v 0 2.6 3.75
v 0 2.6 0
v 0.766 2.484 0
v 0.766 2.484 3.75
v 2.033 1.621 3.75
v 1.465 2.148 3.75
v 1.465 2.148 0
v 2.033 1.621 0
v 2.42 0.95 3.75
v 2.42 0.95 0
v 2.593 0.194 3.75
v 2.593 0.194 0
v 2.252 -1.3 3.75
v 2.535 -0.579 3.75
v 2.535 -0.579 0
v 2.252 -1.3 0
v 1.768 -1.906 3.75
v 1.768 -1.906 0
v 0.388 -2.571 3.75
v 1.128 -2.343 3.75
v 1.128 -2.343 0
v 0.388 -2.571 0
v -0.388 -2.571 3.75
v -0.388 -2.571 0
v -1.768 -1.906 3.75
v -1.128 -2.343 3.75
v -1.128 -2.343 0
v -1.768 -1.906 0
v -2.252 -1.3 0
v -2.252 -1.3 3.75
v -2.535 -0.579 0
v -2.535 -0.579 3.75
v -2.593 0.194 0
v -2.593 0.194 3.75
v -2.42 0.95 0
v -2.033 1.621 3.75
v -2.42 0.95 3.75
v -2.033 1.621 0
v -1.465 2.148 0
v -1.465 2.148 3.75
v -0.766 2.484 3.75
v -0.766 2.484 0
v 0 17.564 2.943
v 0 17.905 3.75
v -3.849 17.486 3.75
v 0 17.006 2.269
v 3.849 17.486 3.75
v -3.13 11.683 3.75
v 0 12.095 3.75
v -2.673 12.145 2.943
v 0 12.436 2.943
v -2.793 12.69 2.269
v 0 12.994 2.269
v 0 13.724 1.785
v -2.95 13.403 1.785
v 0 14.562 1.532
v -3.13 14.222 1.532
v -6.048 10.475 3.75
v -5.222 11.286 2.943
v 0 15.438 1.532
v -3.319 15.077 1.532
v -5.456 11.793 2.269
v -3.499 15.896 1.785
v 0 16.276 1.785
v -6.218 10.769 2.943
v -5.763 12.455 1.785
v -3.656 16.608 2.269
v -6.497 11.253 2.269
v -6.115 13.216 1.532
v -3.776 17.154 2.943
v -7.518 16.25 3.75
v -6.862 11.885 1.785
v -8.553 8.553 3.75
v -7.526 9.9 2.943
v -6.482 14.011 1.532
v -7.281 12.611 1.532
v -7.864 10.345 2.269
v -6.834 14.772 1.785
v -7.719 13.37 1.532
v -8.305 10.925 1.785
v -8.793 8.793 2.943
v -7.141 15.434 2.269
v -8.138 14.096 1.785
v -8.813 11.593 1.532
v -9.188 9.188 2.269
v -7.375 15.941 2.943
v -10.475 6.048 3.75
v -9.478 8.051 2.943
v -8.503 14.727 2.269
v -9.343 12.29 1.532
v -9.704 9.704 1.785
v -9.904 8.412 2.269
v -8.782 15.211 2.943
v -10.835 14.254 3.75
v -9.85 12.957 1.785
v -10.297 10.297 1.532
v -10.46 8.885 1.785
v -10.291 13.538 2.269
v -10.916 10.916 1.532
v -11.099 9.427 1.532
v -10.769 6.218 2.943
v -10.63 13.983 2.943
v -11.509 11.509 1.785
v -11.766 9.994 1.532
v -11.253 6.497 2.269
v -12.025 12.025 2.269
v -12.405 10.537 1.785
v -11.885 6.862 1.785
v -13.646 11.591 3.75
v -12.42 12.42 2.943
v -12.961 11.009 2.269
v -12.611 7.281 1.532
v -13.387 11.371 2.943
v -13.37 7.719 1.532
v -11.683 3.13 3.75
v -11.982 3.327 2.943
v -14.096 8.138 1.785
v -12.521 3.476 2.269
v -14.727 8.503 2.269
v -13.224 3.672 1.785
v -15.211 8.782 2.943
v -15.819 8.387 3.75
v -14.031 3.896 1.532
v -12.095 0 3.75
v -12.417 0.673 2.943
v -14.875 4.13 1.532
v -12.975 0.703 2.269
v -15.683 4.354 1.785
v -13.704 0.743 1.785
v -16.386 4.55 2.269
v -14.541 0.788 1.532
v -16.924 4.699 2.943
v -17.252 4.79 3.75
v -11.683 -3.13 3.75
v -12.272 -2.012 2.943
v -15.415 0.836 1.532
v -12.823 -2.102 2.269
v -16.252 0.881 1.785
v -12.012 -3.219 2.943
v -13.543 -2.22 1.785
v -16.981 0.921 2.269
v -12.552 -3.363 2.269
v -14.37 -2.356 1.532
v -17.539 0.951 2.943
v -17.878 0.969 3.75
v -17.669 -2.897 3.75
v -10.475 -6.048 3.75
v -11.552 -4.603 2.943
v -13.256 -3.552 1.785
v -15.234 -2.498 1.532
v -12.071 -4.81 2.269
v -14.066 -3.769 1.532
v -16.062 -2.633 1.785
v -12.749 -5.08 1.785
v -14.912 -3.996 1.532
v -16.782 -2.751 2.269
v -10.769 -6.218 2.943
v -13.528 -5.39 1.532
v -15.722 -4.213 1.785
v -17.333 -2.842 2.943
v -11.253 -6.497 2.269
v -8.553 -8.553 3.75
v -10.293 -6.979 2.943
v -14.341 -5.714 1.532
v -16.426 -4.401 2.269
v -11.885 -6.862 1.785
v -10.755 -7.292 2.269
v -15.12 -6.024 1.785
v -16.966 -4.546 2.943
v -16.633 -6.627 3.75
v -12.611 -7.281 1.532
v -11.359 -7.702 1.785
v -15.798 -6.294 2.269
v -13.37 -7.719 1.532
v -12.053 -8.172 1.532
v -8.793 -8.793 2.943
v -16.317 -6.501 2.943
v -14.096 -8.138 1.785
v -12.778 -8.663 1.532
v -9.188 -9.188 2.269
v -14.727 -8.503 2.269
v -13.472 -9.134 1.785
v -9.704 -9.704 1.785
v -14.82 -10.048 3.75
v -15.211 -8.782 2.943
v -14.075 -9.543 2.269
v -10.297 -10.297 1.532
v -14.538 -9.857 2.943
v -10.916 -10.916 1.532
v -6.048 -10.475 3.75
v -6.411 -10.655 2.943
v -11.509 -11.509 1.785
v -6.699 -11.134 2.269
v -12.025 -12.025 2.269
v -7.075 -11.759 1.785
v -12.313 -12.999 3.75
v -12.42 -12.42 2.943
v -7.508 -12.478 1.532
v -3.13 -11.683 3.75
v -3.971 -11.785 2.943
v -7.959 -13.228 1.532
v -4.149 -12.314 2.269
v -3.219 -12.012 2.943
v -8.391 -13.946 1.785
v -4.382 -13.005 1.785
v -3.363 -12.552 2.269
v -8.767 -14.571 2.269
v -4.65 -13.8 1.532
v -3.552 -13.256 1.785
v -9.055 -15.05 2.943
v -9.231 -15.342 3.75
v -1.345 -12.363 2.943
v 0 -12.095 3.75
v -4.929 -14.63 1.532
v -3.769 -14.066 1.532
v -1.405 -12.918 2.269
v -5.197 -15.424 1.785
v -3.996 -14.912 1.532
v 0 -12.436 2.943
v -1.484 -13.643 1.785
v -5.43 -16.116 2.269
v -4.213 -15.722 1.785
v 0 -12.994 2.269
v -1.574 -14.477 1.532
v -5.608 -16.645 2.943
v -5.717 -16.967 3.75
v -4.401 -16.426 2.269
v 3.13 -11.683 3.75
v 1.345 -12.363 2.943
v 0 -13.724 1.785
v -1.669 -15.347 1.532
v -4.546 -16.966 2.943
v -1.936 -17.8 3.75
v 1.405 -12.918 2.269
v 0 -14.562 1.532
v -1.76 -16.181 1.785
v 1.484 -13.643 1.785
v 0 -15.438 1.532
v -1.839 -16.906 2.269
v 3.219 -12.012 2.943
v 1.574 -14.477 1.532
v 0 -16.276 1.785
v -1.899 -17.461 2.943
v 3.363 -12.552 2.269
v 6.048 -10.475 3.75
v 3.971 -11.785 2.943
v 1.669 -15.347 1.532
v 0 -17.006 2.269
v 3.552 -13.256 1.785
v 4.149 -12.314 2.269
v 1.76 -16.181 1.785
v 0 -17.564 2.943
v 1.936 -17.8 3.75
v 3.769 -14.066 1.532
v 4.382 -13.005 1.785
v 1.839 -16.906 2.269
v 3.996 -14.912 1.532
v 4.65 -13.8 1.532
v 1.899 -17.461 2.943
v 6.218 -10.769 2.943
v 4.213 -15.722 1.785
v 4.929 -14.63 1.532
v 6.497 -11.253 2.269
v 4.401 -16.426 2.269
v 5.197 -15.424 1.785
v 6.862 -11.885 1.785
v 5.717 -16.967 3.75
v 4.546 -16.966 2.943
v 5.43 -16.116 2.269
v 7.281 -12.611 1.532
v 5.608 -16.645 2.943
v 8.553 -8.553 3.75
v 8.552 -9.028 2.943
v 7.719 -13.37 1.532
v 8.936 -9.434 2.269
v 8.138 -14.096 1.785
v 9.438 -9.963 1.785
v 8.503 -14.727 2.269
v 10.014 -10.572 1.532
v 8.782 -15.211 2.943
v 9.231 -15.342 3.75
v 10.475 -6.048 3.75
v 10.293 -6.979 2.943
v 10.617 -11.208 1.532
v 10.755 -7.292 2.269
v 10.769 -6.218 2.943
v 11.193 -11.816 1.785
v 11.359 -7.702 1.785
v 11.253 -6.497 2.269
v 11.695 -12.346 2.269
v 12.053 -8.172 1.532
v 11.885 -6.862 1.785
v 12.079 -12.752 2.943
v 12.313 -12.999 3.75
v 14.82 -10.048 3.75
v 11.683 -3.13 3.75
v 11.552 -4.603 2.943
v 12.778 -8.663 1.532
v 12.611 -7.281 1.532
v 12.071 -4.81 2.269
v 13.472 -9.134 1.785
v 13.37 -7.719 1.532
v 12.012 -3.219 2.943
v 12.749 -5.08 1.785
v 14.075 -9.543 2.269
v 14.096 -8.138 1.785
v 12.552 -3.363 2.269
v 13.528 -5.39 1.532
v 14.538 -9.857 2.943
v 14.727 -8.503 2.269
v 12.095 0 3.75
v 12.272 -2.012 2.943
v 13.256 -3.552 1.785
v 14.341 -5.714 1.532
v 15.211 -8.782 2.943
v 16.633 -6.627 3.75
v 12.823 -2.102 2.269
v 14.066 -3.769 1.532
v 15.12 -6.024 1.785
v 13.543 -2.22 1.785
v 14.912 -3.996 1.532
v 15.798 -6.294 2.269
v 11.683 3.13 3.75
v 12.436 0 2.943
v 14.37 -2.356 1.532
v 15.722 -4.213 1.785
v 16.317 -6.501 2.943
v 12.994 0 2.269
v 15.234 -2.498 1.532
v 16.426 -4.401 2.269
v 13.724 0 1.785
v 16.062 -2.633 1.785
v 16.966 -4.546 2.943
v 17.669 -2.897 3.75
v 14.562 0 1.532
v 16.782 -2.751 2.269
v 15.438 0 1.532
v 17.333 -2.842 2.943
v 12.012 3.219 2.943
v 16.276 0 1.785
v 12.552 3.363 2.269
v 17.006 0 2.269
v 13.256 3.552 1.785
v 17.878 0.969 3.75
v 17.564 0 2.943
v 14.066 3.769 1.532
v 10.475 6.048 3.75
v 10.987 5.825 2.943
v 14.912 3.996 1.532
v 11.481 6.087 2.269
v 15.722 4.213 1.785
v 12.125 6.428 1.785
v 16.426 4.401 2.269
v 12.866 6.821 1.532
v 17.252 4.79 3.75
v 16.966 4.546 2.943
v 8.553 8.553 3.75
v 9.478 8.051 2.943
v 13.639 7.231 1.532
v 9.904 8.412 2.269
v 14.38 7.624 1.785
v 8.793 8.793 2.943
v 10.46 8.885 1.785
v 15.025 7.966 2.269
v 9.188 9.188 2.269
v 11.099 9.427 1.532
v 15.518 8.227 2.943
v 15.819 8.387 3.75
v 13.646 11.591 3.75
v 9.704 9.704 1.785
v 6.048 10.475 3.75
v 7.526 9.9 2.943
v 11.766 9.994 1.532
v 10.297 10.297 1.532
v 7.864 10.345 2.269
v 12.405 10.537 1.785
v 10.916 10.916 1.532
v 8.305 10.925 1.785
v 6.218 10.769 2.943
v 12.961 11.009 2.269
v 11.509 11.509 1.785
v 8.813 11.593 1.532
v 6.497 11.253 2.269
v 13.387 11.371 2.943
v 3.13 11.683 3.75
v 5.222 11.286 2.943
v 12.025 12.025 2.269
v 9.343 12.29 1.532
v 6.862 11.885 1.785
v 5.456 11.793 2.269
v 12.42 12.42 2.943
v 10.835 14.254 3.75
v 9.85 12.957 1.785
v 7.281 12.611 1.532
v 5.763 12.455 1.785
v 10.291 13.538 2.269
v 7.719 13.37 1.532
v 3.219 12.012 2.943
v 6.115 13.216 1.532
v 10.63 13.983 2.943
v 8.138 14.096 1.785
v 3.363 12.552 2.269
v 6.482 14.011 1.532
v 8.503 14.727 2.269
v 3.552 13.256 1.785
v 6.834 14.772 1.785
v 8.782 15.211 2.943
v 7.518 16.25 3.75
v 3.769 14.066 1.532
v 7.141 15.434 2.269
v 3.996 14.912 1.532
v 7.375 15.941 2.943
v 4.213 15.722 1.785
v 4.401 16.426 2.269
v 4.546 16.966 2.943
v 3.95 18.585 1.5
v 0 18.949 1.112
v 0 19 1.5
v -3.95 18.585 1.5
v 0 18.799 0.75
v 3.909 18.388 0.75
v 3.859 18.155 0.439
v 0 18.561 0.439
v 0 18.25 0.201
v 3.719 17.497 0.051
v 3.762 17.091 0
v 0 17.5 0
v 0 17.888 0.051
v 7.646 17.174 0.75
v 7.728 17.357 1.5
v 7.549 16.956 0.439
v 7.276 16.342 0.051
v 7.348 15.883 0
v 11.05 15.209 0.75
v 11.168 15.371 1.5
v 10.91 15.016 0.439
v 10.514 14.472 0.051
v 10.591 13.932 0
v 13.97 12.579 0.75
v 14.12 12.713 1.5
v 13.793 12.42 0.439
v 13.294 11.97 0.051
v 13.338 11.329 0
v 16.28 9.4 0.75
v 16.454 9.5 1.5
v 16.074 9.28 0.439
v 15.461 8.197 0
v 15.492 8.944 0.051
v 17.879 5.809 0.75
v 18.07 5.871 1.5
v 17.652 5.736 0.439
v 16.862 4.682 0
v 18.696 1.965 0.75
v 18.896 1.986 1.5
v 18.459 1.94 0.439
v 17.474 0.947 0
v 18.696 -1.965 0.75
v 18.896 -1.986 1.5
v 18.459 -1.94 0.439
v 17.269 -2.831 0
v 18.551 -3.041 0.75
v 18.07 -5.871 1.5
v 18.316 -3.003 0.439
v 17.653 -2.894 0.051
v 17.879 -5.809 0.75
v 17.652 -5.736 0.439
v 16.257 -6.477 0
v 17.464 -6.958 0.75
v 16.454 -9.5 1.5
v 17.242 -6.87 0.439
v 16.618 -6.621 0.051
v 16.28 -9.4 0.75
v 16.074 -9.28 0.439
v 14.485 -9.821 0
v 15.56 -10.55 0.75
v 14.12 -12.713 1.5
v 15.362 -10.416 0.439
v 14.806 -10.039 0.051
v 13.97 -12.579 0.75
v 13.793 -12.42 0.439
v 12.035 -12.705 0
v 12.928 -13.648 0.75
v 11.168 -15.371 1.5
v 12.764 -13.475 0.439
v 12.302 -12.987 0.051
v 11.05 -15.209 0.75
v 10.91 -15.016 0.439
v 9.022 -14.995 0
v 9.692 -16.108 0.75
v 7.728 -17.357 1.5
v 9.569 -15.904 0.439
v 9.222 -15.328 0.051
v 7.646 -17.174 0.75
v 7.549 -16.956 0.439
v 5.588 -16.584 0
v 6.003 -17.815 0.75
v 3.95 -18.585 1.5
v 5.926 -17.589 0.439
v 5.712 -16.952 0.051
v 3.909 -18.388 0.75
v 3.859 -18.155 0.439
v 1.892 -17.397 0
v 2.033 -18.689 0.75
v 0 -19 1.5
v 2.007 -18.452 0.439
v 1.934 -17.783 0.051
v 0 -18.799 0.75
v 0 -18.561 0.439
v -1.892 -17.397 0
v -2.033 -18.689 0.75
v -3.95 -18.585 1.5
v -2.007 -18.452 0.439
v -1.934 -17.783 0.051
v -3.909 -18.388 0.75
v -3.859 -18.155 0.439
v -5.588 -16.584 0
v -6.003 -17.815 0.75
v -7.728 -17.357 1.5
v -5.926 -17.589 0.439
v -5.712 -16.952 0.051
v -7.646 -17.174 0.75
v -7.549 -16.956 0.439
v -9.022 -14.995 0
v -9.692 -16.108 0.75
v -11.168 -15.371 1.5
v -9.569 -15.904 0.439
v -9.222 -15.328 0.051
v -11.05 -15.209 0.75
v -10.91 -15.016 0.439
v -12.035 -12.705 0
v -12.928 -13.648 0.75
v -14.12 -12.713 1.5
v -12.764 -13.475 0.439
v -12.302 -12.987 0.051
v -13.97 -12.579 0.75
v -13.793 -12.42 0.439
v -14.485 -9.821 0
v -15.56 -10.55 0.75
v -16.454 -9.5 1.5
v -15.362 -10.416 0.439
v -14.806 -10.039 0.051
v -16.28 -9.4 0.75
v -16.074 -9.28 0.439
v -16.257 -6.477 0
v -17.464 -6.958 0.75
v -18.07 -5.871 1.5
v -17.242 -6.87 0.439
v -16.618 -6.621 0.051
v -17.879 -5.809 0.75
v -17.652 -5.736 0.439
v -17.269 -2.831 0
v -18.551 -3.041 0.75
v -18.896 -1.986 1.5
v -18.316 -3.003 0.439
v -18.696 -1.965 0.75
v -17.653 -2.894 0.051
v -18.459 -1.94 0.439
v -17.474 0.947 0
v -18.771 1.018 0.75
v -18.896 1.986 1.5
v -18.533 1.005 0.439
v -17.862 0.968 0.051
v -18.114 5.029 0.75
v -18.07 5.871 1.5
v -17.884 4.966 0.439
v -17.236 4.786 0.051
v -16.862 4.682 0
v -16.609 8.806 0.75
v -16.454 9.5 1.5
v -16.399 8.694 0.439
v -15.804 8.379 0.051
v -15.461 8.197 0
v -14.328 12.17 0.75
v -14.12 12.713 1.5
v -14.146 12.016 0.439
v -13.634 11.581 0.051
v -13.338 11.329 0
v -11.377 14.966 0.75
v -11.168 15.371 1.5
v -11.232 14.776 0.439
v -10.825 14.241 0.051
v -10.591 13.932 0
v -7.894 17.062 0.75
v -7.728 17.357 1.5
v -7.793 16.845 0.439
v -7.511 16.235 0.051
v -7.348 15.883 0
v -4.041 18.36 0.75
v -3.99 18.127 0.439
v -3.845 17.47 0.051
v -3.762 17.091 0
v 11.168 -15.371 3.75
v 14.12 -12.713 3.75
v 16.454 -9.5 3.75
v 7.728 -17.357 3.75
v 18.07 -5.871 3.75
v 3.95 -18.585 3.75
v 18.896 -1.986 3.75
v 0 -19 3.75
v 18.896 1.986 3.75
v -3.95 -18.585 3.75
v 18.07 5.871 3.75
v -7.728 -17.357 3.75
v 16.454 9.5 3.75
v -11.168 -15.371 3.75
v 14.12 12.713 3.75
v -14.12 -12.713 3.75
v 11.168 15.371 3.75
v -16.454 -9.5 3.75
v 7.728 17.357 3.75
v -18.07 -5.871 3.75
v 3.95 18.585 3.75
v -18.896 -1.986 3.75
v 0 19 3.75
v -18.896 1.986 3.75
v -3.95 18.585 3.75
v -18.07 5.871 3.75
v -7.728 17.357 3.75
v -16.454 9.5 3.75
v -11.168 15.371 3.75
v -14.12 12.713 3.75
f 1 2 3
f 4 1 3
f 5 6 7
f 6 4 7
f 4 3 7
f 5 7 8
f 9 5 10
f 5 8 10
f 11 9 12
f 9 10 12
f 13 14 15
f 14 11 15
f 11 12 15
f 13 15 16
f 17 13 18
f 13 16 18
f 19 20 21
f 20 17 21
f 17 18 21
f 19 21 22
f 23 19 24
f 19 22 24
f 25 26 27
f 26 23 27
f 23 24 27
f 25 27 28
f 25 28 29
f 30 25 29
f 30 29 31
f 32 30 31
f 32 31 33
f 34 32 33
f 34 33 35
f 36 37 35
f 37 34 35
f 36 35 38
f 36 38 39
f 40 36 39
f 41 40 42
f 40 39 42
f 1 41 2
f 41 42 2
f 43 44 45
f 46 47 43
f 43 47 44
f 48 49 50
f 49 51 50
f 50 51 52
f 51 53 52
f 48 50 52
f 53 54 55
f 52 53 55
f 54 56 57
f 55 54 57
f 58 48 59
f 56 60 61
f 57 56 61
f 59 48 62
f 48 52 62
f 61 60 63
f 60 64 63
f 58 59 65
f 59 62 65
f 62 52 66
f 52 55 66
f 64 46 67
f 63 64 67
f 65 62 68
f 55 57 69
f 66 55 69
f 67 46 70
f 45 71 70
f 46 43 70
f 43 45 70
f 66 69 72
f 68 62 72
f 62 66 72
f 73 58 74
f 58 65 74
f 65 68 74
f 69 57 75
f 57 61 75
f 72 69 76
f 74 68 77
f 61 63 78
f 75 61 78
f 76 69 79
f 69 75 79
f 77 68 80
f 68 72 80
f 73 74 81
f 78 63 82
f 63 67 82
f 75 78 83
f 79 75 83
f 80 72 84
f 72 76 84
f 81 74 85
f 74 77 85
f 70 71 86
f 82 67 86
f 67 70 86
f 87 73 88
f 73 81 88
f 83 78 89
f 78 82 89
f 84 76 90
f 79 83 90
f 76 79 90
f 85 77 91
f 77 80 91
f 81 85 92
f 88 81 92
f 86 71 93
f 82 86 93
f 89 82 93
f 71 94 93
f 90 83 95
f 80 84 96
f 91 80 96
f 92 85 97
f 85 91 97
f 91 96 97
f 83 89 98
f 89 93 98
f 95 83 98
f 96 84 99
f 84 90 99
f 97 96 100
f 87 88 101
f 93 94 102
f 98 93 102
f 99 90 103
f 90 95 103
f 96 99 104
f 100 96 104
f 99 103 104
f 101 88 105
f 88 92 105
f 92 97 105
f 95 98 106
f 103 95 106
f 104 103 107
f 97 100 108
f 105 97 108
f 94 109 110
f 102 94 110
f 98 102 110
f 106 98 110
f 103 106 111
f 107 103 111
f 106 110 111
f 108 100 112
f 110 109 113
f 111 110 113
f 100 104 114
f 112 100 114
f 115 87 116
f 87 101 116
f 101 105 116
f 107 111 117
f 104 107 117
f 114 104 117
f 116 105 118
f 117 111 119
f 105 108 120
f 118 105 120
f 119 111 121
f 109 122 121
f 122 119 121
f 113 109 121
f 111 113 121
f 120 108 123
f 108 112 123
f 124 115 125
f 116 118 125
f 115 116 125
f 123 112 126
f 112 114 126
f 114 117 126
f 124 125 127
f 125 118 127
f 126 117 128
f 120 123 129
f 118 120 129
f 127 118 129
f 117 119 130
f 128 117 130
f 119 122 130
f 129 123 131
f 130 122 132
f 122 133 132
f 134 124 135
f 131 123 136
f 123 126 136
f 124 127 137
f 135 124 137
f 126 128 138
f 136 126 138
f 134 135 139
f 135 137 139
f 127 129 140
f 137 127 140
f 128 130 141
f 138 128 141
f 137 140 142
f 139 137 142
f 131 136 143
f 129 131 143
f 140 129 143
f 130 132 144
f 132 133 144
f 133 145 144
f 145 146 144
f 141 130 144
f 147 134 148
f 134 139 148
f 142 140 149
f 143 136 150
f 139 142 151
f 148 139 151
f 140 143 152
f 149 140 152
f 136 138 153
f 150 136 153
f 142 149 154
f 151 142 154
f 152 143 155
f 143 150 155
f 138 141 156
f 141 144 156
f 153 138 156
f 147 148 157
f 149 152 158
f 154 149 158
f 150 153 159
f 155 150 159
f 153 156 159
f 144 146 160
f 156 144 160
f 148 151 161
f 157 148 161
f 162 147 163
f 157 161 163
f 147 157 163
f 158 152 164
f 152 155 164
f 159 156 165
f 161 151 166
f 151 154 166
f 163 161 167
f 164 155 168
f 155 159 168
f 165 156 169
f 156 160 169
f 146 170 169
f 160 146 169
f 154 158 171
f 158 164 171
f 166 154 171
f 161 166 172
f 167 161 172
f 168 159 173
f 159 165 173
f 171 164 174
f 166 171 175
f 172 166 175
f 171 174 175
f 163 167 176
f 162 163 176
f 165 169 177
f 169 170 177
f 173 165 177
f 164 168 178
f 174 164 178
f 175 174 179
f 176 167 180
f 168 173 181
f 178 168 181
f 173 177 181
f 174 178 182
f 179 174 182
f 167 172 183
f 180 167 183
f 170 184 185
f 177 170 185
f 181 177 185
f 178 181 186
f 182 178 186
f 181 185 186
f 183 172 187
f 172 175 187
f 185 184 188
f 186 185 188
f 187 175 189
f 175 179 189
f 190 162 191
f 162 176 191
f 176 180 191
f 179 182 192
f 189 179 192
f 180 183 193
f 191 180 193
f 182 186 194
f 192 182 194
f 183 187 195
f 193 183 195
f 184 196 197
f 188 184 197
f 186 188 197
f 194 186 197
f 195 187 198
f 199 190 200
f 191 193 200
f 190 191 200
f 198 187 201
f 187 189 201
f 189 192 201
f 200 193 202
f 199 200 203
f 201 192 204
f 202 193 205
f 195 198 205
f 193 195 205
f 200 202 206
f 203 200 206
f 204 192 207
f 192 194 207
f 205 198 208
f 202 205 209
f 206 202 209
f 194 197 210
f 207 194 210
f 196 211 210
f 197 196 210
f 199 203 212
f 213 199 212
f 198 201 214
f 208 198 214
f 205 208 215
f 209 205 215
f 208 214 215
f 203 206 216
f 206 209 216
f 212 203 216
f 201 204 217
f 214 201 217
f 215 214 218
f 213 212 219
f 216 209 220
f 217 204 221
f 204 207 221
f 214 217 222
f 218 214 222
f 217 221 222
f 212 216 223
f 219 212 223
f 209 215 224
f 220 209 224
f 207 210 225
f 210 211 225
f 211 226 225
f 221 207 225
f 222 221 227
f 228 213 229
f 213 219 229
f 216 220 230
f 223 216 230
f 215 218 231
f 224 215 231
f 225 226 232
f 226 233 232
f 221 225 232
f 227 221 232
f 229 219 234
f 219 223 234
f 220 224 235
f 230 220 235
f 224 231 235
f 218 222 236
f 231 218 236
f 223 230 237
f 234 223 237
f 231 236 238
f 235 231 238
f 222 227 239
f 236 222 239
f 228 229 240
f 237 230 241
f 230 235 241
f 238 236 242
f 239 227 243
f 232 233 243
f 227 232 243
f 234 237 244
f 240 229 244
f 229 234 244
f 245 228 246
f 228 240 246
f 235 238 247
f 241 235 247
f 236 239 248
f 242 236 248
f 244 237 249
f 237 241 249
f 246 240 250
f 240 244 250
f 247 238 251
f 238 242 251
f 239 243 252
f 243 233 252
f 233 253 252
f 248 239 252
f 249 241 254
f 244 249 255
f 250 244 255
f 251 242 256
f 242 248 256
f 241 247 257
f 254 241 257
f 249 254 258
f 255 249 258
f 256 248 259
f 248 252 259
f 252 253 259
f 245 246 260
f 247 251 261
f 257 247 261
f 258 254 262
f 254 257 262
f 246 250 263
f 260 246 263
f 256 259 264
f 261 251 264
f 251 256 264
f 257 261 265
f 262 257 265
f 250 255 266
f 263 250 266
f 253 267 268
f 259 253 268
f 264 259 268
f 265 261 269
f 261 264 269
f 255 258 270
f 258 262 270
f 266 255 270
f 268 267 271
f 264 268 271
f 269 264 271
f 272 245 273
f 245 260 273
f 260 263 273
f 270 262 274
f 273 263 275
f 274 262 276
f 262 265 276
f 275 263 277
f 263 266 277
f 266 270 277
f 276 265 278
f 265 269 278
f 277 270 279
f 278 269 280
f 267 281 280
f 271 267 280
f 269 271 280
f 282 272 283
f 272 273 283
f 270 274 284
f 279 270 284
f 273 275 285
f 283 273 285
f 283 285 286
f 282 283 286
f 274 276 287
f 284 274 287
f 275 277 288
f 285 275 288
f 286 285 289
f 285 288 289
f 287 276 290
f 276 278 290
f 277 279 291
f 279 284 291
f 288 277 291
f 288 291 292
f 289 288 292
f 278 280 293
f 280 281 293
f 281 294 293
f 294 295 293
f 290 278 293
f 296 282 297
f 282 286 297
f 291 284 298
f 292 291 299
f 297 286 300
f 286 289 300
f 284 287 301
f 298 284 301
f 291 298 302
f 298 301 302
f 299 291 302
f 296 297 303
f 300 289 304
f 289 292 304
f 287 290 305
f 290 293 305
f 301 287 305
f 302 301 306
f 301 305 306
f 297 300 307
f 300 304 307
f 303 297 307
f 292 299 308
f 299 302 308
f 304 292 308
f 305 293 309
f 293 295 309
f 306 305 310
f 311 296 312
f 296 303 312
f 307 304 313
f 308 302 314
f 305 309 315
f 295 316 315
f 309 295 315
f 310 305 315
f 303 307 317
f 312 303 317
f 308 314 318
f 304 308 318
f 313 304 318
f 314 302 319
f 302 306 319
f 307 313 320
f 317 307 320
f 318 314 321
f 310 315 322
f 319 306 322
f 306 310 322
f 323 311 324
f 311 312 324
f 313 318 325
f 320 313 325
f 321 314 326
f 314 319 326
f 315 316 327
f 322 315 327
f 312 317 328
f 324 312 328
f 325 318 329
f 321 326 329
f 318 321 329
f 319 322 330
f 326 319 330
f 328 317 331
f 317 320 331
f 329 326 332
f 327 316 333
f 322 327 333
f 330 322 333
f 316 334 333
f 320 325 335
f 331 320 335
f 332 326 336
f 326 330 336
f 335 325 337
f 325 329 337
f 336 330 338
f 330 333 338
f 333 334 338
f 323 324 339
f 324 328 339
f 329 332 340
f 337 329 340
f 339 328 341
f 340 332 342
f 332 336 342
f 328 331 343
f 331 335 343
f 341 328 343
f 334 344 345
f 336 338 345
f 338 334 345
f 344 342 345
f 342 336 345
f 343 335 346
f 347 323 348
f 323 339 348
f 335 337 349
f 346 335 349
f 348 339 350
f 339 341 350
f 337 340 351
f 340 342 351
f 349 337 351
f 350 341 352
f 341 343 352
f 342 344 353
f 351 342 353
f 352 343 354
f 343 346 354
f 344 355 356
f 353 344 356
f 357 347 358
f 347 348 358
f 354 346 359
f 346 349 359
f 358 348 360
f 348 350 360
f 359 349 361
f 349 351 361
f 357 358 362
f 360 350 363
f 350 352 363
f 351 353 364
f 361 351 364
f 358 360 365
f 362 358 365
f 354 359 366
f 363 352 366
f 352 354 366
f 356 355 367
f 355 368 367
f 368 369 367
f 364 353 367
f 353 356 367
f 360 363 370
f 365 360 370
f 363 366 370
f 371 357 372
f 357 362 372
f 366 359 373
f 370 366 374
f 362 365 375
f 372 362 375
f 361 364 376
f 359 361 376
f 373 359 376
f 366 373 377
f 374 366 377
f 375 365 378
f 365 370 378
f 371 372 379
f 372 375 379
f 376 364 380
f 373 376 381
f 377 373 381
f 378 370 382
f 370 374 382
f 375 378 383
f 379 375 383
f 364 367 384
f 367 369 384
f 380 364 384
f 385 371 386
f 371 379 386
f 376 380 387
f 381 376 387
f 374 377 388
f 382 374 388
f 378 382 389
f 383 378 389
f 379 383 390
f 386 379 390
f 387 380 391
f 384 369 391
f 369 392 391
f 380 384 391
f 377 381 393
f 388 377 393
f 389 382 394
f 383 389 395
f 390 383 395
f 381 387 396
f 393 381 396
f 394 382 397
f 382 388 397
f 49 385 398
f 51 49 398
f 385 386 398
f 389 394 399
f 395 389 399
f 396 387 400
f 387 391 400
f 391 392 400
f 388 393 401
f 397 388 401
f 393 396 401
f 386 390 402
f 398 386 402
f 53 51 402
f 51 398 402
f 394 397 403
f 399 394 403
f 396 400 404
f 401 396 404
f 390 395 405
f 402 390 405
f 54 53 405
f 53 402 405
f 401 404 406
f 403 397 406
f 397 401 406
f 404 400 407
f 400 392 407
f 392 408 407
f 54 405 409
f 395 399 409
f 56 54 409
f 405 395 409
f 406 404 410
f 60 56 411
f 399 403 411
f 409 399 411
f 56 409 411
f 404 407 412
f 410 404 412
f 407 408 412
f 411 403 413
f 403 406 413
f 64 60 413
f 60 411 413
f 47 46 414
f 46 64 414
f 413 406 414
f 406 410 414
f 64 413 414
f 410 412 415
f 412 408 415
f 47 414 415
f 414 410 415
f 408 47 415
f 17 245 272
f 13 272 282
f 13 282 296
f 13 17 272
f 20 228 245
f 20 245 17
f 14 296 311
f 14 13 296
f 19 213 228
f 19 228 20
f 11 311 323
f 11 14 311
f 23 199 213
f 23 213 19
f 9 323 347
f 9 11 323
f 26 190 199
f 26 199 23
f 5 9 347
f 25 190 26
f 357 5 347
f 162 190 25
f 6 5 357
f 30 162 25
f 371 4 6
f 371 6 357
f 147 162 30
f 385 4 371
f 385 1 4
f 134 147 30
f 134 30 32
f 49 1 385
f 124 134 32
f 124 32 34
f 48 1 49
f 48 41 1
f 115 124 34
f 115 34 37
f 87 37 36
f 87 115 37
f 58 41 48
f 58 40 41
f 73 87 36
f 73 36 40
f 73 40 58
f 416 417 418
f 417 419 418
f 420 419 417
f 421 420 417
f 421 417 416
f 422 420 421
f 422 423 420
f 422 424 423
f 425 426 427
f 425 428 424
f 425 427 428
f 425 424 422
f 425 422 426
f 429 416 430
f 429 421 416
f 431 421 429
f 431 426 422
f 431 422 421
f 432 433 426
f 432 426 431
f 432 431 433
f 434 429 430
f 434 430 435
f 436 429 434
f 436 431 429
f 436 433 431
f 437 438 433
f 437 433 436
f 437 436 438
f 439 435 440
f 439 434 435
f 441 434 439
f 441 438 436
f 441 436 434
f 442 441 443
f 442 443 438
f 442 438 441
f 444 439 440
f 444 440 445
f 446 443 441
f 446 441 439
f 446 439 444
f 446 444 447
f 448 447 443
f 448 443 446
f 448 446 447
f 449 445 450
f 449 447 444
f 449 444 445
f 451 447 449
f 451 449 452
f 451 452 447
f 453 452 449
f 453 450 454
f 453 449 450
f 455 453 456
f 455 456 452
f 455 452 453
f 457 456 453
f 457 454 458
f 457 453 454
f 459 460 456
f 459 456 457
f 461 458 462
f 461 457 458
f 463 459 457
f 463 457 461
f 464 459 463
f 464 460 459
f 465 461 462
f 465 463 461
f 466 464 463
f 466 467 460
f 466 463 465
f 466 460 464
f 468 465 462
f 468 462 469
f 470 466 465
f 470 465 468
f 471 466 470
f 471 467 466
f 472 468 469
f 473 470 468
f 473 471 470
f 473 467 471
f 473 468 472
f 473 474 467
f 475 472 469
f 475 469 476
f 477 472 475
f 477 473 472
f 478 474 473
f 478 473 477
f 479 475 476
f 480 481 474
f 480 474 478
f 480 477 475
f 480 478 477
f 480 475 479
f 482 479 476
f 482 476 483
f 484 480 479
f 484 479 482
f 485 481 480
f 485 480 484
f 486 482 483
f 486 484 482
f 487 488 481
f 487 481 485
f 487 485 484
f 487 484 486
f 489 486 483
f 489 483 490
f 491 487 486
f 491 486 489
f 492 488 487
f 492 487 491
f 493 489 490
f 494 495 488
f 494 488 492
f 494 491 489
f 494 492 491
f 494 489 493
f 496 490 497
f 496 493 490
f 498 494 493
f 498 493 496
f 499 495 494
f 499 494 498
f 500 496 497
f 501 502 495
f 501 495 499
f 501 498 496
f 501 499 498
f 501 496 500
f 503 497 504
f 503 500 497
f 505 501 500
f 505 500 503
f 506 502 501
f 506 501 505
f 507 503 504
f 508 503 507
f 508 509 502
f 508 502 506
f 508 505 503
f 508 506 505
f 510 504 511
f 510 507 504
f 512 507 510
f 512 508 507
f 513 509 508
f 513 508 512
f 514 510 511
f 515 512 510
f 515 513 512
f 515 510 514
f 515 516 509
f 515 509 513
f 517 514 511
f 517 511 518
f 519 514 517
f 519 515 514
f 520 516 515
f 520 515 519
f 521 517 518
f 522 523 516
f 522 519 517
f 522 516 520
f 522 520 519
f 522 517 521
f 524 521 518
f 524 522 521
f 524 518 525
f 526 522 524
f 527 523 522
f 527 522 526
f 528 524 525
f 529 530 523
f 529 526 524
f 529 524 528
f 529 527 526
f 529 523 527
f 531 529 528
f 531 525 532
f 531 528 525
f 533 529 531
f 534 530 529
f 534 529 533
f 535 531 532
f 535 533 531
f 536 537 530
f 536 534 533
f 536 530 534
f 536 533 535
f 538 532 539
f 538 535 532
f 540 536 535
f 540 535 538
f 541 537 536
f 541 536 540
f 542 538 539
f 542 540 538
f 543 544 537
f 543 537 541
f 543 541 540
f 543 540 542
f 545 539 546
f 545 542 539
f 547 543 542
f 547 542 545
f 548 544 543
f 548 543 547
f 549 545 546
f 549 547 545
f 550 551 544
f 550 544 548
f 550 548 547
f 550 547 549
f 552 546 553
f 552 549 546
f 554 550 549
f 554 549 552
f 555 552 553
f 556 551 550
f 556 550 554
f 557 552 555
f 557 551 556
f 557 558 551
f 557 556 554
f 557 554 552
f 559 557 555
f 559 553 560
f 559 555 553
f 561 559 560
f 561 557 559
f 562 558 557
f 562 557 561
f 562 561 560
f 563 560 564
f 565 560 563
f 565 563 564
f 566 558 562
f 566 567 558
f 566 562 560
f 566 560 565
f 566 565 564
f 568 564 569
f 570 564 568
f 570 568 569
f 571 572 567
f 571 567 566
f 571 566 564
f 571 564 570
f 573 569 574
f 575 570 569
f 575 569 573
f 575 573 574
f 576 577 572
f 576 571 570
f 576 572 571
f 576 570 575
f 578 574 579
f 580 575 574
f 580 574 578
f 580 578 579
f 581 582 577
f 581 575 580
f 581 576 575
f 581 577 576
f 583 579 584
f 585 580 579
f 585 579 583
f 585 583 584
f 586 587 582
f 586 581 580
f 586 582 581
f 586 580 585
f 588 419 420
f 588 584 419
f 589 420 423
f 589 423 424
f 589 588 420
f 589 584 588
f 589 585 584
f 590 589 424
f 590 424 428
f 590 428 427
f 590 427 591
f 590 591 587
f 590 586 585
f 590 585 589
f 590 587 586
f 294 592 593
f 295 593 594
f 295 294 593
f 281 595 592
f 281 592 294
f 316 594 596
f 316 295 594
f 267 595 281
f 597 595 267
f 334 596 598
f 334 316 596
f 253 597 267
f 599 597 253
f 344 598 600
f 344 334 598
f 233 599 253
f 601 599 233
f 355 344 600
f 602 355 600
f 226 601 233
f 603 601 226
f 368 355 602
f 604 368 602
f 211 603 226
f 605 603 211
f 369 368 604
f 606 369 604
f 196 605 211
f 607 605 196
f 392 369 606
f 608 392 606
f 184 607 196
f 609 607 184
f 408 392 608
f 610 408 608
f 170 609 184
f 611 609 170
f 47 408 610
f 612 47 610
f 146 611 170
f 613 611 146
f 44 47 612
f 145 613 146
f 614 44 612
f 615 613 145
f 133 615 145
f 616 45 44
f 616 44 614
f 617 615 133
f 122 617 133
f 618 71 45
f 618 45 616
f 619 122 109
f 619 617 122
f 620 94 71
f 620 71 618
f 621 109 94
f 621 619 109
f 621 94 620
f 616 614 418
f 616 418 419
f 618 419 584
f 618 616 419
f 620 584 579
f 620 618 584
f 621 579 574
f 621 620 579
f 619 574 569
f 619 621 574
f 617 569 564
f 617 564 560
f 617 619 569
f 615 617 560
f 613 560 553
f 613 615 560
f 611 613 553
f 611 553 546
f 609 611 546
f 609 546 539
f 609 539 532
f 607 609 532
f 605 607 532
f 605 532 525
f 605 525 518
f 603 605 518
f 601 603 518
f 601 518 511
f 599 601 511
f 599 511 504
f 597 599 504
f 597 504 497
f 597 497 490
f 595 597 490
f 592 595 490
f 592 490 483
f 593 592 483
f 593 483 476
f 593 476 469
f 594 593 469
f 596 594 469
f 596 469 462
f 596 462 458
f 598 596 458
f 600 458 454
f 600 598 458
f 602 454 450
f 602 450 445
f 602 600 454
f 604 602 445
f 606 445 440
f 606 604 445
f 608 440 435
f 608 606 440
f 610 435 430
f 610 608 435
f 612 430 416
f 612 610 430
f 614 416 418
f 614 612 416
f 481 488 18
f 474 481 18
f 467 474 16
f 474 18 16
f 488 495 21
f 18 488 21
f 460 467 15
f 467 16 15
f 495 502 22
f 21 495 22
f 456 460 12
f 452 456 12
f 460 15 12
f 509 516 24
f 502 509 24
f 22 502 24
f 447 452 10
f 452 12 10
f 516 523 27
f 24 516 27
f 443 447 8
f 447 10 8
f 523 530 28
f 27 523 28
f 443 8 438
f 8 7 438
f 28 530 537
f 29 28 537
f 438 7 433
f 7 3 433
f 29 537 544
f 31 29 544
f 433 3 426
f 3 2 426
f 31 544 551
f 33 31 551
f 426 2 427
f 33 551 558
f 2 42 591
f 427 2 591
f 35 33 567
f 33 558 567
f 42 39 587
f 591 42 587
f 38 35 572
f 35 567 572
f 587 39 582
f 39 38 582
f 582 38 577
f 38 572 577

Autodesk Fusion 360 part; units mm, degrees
sketch "Sketch1" plane through (0, 0, 0) normal (1, 0, 0) x (0, 1, 0)
  line L0 (0, 0) -> (15, 0) construction
  line L1 (15, 0) -> (15, 4.5) construction
  circle A0 centre (15, 4.5) radius 3
  line L2 (15, 0) -> (11, 0) construction
  line L3 (11, 0) -> (19, 0)
  line L4 (19, 0) -> (19, 3.75)
  line L5 (19, 3.75) -> (11, 3.75)
  line L6 (11, 3.75) -> (2.6, 3.75)
  line L7 (2.6, 3.75) -> (2.6, 0)
  line L8 (2.6, 0) -> (11, 0)
  dimension "d1" = 15
  dimension "d2" = 4.5
  dimension "d3" = 6
  dimension "d4" = 4
  dimension "d5" = 8
  dimension "d6" = 3.75
  dimension "d7" = 2.6
revolve "Revolve1" add sketch "Sketch1" angle 360 about axis through (0, 0, 1.75) along (0, 0, 1) contours A0 L3 L4 L5 L6 L7 L8
fillet "Fillet1" radius 1.5 1 edges at (-17.7142, 6.8707, 0)
